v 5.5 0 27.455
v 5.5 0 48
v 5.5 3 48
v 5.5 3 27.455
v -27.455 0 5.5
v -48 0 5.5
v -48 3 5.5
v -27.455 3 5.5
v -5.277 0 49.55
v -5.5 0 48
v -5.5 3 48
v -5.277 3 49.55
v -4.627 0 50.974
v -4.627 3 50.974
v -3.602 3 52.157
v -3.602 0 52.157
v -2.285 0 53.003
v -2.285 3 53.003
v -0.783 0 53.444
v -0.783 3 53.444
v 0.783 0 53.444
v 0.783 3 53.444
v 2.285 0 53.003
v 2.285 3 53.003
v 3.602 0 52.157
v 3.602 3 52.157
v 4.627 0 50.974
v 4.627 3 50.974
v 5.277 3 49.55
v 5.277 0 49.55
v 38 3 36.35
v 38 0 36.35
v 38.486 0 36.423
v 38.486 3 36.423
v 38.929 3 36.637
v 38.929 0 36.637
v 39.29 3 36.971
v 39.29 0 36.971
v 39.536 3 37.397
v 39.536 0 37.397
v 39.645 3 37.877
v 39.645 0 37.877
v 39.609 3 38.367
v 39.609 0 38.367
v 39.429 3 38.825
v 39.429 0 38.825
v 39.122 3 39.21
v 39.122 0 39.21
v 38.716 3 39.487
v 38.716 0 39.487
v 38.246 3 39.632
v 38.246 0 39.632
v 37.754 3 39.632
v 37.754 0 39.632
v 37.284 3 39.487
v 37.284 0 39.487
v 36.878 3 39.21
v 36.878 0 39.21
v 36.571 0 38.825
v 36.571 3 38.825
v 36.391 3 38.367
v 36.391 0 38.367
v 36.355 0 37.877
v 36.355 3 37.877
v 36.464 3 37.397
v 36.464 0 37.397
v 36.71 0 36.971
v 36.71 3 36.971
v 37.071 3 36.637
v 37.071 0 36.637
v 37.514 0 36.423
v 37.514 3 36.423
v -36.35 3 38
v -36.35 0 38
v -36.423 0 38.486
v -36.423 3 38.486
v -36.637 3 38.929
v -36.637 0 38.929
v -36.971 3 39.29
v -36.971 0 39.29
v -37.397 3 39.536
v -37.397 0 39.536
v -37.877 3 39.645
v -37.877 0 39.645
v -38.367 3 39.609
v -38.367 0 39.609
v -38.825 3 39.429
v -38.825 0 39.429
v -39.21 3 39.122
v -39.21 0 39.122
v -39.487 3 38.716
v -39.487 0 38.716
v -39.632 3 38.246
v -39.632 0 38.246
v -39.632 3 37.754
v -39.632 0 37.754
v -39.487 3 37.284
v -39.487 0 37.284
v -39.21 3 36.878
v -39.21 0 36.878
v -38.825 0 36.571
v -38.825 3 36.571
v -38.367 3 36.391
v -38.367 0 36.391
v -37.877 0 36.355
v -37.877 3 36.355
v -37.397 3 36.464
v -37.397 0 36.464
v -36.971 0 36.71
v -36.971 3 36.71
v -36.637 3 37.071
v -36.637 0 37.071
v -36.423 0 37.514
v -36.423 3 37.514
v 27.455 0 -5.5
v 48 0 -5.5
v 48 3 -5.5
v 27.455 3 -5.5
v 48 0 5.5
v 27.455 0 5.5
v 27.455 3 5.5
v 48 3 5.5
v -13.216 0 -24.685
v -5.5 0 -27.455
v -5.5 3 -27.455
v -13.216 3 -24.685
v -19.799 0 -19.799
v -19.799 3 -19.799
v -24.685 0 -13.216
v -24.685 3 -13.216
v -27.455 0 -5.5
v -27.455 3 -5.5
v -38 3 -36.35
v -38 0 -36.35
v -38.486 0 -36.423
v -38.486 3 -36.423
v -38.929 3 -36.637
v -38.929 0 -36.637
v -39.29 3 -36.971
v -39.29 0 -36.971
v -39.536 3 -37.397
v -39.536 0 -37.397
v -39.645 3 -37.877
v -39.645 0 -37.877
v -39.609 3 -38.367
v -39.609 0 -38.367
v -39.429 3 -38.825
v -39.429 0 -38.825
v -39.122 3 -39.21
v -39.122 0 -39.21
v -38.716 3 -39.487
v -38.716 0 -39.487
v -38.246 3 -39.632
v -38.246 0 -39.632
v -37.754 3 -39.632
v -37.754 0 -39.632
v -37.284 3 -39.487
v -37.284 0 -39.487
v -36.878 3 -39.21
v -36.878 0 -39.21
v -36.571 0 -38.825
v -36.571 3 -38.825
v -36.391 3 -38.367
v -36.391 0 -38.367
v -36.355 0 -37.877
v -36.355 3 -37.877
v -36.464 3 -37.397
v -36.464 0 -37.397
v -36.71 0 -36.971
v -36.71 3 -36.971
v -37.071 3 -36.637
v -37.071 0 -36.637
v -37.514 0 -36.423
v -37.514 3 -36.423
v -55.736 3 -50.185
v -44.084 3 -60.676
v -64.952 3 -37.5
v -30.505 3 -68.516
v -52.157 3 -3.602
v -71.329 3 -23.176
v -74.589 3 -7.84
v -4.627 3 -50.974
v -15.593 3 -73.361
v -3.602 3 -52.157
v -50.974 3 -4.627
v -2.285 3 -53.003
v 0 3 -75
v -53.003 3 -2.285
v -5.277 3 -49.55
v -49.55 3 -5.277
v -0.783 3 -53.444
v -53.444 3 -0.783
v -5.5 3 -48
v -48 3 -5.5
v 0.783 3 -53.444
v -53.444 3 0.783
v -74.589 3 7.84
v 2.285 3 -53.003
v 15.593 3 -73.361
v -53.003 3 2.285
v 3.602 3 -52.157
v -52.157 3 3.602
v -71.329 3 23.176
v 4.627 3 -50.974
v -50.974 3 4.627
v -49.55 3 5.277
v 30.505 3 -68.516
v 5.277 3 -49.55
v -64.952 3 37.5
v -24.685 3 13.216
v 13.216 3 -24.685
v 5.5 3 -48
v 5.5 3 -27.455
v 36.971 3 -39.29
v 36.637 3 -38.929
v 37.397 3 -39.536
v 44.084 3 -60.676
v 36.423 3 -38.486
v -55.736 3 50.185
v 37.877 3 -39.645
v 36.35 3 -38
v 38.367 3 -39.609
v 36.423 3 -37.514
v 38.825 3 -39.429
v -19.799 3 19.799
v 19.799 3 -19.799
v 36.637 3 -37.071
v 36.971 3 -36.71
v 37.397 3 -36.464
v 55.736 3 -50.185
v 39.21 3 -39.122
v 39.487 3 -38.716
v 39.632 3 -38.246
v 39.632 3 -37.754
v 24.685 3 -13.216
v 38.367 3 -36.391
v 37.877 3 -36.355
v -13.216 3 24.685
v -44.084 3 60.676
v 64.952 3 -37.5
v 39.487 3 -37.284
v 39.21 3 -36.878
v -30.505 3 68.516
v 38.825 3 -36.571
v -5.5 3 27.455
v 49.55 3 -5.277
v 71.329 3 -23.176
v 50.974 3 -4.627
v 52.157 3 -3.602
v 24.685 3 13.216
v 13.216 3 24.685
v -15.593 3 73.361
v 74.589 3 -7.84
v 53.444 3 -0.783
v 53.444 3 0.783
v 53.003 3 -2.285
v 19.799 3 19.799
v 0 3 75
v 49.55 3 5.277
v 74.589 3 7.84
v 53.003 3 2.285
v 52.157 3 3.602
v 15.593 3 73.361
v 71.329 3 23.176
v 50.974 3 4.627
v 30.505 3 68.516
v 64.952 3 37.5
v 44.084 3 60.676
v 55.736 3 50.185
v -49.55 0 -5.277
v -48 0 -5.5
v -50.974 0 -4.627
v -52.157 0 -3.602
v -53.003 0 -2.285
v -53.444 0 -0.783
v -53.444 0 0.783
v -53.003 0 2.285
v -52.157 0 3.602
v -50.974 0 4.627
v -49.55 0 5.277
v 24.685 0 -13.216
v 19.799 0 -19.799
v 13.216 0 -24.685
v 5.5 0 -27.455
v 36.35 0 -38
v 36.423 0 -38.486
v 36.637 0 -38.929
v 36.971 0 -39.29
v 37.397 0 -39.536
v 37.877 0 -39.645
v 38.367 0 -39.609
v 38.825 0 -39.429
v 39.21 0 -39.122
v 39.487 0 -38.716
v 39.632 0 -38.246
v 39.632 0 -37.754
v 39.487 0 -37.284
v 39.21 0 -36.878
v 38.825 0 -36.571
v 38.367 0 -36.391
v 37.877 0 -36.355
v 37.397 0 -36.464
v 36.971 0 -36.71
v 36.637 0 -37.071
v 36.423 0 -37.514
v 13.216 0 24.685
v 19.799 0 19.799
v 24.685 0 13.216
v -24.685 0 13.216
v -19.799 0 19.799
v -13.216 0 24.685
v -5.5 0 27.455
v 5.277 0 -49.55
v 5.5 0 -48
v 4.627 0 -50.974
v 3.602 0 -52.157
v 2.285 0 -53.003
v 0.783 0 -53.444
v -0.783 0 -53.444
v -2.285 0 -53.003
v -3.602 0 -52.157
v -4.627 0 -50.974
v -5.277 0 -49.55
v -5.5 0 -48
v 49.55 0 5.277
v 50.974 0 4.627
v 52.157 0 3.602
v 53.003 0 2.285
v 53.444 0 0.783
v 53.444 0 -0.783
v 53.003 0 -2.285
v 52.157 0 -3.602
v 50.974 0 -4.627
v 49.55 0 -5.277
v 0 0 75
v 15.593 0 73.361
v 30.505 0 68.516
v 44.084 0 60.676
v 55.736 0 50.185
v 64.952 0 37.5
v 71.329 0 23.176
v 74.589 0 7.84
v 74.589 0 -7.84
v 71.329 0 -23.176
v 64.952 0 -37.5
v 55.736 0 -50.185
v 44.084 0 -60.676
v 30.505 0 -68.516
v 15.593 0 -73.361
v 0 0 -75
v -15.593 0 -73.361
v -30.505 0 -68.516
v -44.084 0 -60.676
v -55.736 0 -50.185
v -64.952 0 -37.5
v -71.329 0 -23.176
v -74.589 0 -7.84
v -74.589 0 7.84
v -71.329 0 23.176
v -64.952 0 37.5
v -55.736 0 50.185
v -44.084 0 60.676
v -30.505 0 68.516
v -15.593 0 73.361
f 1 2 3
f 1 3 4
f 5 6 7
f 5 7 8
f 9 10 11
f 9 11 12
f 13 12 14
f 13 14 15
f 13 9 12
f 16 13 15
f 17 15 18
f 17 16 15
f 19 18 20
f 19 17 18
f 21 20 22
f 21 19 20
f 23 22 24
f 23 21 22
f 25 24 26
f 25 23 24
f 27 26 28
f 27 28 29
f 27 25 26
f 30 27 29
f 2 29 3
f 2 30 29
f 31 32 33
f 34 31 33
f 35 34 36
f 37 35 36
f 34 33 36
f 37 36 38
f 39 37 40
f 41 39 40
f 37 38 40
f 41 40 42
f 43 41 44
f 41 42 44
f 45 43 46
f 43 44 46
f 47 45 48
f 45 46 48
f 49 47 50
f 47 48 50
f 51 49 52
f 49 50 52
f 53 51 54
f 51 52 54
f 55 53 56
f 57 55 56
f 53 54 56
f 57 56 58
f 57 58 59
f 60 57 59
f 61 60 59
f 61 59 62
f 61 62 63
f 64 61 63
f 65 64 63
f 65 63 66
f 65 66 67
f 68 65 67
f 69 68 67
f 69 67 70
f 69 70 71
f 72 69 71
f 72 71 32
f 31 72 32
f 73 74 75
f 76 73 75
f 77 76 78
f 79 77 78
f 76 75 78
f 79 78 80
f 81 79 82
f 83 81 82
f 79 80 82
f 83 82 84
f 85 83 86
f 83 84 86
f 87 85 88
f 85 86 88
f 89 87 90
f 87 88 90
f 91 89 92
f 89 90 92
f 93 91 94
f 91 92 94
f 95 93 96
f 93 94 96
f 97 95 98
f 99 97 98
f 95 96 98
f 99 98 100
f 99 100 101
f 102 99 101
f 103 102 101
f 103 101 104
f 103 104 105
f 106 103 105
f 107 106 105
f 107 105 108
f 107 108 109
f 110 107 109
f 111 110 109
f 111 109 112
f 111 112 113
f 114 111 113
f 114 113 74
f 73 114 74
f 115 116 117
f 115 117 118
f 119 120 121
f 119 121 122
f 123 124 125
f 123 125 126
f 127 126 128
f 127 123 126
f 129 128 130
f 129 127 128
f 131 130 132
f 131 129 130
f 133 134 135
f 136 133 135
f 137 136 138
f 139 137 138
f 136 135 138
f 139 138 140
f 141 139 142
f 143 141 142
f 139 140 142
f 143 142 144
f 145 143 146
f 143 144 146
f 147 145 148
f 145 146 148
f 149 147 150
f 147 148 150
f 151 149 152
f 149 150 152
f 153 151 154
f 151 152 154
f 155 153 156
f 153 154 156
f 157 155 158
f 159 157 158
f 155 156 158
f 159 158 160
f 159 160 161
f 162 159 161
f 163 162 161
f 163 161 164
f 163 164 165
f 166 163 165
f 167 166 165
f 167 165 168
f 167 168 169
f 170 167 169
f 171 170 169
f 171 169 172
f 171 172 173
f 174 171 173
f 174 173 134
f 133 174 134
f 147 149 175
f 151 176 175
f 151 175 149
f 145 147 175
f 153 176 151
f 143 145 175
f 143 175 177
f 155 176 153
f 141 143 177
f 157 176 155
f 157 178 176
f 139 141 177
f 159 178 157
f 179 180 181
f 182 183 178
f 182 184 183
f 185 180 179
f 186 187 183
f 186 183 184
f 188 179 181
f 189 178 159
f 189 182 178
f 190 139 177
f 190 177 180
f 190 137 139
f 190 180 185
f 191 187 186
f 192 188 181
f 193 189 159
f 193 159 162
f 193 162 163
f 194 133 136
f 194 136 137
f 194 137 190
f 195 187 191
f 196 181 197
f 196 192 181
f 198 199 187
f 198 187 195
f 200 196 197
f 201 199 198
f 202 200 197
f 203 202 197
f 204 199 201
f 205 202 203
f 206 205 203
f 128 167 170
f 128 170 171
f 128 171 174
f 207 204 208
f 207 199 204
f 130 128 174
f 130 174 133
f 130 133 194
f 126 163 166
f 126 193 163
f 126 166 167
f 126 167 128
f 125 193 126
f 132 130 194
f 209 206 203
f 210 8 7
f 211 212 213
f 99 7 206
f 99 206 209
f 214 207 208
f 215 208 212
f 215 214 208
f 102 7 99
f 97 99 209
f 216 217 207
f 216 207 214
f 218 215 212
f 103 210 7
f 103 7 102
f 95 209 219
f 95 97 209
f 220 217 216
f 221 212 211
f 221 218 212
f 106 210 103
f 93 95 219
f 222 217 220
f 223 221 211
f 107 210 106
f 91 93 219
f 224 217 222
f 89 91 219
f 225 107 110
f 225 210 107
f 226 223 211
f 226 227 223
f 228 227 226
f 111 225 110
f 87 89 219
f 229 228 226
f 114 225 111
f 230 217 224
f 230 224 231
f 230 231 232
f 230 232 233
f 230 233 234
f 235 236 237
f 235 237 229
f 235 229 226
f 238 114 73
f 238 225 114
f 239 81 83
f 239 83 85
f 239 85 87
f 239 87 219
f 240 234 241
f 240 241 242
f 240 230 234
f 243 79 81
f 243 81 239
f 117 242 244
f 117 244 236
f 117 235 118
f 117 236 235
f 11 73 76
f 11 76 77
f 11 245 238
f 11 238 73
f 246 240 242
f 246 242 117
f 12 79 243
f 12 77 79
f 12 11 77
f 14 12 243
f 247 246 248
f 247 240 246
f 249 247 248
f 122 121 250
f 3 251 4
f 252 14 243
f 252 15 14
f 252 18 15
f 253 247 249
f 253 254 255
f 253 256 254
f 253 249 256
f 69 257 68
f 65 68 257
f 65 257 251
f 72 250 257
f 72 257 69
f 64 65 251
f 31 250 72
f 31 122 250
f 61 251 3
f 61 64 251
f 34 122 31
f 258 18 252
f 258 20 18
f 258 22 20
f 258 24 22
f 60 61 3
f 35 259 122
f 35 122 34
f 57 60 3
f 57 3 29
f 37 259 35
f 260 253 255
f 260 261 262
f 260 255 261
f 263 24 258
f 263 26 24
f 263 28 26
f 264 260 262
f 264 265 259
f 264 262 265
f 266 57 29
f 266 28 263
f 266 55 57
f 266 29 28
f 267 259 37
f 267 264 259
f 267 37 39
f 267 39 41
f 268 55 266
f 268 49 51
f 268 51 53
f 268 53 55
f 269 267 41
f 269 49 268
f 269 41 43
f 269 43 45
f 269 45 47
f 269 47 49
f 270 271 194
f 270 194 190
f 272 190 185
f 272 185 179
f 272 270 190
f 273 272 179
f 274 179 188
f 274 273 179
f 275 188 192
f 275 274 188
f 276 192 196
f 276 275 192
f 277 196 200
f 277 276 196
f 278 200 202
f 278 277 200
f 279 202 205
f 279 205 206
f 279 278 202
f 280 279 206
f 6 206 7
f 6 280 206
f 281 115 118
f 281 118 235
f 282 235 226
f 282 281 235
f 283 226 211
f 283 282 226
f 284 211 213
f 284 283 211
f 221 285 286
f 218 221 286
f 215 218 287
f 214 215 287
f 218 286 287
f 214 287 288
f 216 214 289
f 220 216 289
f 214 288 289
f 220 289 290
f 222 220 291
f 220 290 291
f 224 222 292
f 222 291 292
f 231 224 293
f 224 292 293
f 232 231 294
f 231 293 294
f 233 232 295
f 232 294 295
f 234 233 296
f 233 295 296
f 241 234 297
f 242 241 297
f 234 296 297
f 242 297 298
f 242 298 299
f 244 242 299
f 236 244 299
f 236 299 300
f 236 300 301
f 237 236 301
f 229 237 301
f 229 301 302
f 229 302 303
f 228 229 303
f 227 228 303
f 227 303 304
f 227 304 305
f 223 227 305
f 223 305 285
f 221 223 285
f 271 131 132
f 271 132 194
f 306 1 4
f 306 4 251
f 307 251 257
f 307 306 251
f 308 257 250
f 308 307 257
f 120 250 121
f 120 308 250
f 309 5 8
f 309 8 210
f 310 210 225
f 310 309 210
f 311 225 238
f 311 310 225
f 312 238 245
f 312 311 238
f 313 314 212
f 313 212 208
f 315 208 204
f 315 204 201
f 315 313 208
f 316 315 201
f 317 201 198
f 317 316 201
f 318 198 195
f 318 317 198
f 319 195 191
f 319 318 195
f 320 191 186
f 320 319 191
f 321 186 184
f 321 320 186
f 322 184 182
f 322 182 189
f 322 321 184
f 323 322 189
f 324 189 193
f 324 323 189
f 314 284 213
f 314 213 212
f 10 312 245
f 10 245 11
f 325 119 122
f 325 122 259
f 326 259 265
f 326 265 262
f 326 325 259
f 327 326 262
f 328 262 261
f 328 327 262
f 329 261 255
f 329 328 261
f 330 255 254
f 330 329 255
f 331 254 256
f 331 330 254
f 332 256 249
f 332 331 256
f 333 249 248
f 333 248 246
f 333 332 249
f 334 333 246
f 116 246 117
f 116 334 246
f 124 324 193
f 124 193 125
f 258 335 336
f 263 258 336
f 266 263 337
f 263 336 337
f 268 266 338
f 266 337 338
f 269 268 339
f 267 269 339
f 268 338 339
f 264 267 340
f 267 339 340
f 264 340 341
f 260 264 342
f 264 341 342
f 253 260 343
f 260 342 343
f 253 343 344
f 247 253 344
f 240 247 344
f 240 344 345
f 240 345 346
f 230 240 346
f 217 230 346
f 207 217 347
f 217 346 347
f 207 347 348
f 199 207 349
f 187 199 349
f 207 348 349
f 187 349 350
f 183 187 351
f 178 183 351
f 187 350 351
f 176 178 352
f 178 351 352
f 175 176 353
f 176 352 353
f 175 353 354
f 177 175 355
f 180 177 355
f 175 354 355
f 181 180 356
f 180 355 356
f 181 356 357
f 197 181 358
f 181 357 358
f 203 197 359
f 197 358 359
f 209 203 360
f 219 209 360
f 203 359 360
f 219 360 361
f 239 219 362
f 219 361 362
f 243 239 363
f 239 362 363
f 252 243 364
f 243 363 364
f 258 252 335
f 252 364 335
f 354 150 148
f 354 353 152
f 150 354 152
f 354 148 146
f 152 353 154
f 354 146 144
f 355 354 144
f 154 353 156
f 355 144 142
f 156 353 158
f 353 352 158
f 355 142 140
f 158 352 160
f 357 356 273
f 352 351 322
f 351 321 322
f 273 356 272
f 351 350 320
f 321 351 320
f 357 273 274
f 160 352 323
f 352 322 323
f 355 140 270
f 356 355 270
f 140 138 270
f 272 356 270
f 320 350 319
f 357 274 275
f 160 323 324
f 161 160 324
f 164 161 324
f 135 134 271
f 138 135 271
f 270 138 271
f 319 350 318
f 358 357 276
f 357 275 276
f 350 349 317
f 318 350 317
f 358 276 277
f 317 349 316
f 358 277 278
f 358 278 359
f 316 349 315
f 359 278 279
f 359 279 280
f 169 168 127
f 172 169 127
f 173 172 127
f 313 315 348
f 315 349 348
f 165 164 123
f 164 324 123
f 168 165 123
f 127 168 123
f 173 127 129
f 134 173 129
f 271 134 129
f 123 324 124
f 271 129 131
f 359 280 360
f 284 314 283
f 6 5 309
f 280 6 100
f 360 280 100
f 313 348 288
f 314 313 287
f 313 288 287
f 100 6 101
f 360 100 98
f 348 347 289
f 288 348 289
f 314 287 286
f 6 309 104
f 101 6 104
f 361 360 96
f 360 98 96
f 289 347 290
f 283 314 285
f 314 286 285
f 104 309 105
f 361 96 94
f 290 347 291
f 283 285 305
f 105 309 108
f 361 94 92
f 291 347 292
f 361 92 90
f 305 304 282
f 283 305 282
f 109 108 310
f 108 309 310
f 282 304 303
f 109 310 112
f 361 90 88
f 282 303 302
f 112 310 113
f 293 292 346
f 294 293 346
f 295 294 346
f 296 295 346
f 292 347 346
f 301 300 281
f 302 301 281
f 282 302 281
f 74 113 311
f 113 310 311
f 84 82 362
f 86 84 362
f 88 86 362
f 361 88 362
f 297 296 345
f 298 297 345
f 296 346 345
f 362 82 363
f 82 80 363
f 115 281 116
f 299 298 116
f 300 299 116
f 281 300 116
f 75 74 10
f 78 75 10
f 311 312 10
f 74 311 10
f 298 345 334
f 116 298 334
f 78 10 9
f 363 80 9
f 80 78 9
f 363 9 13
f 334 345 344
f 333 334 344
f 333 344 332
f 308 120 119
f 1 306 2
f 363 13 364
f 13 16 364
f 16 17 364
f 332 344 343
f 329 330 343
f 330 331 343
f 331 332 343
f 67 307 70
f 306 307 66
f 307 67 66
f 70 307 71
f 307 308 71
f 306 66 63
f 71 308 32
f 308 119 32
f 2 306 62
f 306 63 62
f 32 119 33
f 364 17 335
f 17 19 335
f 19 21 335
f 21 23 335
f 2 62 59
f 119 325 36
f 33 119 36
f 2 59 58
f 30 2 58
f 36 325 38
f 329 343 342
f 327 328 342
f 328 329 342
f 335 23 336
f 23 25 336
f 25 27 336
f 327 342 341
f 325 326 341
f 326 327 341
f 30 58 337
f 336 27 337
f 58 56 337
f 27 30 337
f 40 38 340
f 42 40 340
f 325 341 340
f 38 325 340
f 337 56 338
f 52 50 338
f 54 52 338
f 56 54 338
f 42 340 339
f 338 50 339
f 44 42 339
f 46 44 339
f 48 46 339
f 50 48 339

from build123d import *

# Parameters (mm, degrees)
SKETCH1_R                   = 75
SKETCH1_R_2                 = 28
BOSS_EXTRUDE1_DEPTH         = 3
CUT_EXTRUDE2_START          = -3
CUT_EXTRUDE2_DEPTH          = 3
CIRPATTERN1_COUNT           = 4
TAP_DRILL_FOR_M4X0_7_TAP1_D = 3.3
CIRPATTERN2_COUNT           = 4


with BuildPart() as part:
    # Sketch1 → Boss-Extrude1 (new body)
    with BuildSketch(Plane(origin=(0, 0, 0), x_dir=(1, 0, 0), z_dir=(0, 1, 0))):
        with Locations(Location((0, 0, 0), (0, 0, 270))):
            Circle(SKETCH1_R)
        with Locations(Location((0, 0, 0), (0, 0, 270))):
            Circle(SKETCH1_R_2, mode=Mode.SUBTRACT)
    extrude(amount=BOSS_EXTRUDE1_DEPTH)

    # Sketch2 → Cut-Extrude2 (cut)
    with BuildSketch(Plane(origin=(0, 3, 0), x_dir=(1, 0, 0), z_dir=(0, 1, 0)).offset(CUT_EXTRUDE2_START)):
        with BuildLine():
            Line((5.5, 27.454507827), (5.5, 48))
            ThreePointArc((5.5, 48), (0, 53.5), (-5.5, 48))
            Line((-5.5, 48), (-5.5, 27.454507827))
            ThreePointArc((-5.5, 27.454507827), (0, 28), (5.5, 27.454507827))
        make_face()
    cut_extrude2 = extrude(amount=CUT_EXTRUDE2_DEPTH, mode=Mode.SUBTRACT)

    # CirPattern1: Cut-Extrude2 ×4 about axis
    cirpattern1_axis = Axis((0, 0, 0), (0, 1, 0))
    for i in range(1, CIRPATTERN1_COUNT):
        add(cut_extrude2.rotate(cirpattern1_axis, i * 360 / CIRPATTERN1_COUNT), mode=Mode.SUBTRACT)

    # Tap Drill for M4x0.7 Tap1 (through all)
    with Locations(Plane(origin=(0, 3, 0), x_dir=(1, 0, 0), z_dir=(0, 1, 0))):
        with Locations((38, 38)):
            tap_drill_for_m4x0_7_tap1 = Hole(TAP_DRILL_FOR_M4X0_7_TAP1_D / 2)

    # CirPattern2: Tap Drill for M4x0.7 Tap1 ×4 about axis
    cirpattern2_axis = Axis((0, 0, 0), (0, 1, 0))
    for i in range(1, CIRPATTERN2_COUNT):
        add(tap_drill_for_m4x0_7_tap1.rotate(cirpattern2_axis, i * 360 / CIRPATTERN2_COUNT), mode=Mode.SUBTRACT)


solid = part.part
